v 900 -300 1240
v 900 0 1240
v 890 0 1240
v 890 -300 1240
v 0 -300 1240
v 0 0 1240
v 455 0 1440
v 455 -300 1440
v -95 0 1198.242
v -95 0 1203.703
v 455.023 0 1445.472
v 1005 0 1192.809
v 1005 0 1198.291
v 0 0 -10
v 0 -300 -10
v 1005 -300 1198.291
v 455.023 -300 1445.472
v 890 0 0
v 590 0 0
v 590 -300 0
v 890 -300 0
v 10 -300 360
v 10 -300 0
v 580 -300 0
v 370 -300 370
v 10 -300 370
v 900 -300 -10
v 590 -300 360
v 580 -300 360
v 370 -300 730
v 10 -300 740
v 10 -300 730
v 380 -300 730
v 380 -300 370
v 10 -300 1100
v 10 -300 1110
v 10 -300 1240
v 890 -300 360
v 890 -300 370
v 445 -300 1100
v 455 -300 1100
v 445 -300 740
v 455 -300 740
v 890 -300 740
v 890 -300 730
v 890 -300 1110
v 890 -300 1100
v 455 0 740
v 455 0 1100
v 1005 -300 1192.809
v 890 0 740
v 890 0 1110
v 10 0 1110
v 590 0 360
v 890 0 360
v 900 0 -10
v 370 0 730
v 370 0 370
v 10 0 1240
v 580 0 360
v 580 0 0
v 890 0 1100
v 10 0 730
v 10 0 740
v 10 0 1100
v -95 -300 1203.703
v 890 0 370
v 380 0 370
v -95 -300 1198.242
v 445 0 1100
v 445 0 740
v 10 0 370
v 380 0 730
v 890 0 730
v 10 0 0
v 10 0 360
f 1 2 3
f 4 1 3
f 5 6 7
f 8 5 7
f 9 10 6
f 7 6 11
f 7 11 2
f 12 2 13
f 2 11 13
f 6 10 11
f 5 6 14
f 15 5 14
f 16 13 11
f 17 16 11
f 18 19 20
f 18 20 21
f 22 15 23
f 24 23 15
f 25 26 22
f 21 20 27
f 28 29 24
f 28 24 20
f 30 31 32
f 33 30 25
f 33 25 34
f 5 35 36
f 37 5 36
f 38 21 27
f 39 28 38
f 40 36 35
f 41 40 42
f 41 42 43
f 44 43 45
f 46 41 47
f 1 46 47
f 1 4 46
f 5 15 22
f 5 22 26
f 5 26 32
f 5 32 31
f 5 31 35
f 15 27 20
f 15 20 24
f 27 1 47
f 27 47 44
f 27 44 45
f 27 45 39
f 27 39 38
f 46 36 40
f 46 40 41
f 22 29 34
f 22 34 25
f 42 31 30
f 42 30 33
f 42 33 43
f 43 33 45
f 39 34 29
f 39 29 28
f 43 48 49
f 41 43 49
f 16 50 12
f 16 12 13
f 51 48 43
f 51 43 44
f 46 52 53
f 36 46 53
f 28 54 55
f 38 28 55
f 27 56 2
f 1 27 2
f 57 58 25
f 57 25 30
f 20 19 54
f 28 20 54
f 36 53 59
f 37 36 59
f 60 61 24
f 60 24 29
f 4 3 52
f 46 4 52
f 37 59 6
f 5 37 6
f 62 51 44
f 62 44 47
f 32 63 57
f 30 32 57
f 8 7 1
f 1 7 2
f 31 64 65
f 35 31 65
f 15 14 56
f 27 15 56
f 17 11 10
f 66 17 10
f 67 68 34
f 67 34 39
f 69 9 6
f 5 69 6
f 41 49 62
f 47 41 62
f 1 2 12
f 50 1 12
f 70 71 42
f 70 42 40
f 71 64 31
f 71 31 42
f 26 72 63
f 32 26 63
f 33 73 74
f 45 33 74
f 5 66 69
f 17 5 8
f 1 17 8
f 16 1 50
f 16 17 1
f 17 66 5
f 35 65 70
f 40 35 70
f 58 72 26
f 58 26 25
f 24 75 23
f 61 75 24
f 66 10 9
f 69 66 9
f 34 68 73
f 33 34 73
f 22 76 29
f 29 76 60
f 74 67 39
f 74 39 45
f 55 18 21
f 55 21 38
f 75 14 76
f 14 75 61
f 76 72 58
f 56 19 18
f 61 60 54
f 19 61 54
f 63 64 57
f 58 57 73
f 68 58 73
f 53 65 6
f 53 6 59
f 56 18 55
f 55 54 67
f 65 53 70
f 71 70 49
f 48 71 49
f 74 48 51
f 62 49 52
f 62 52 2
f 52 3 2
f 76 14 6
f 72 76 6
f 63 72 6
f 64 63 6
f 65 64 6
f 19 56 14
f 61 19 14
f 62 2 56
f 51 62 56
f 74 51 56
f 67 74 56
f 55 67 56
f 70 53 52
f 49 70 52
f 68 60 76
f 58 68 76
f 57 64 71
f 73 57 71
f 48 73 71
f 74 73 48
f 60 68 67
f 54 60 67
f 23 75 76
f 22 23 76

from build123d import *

# Parameters (mm, degrees)
F0_W     = 570
F0_H     = 360
F0_W_2   = 360
F0_W_3   = 300
F0_W_4   = 510
F0_W_5   = 435
F1_DEPTH = 300


with BuildPart() as f1:
    # F0 (on Front) → F1 (new body)
    with BuildSketch(Plane.XZ):
        Polygon((-95, 1198.241758), (0, 1240), (455, 1440), (900, 1240), (1005, 1192.808989), (1005, 1198.290765), (455.022565, 1445.471634), (-95, 1203.703474), align=None)
        Polygon((0, 1240), (0, -10), (900, -10), (900, 1240), (890, 1240), (890, 1110), (10, 1110), (10, 1240), align=None)
        with Locations((295, 180)):
            Rectangle(F0_W, F0_H, mode=Mode.SUBTRACT)
        with Locations((190, 550)):
            Rectangle(F0_W_2, F0_H, mode=Mode.SUBTRACT)
        with Locations((740, 180)):
            Rectangle(F0_W_3, F0_H, mode=Mode.SUBTRACT)
        with Locations((635, 550)):
            Rectangle(F0_W_4, F0_H, mode=Mode.SUBTRACT)
        with Locations((227.5, 920)):
            Rectangle(F0_W_5, F0_H, mode=Mode.SUBTRACT)
        with Locations((672.5, 920)):
            Rectangle(F0_W_5, F0_H, mode=Mode.SUBTRACT)
    extrude(amount=F1_DEPTH)


solid = f1.part
